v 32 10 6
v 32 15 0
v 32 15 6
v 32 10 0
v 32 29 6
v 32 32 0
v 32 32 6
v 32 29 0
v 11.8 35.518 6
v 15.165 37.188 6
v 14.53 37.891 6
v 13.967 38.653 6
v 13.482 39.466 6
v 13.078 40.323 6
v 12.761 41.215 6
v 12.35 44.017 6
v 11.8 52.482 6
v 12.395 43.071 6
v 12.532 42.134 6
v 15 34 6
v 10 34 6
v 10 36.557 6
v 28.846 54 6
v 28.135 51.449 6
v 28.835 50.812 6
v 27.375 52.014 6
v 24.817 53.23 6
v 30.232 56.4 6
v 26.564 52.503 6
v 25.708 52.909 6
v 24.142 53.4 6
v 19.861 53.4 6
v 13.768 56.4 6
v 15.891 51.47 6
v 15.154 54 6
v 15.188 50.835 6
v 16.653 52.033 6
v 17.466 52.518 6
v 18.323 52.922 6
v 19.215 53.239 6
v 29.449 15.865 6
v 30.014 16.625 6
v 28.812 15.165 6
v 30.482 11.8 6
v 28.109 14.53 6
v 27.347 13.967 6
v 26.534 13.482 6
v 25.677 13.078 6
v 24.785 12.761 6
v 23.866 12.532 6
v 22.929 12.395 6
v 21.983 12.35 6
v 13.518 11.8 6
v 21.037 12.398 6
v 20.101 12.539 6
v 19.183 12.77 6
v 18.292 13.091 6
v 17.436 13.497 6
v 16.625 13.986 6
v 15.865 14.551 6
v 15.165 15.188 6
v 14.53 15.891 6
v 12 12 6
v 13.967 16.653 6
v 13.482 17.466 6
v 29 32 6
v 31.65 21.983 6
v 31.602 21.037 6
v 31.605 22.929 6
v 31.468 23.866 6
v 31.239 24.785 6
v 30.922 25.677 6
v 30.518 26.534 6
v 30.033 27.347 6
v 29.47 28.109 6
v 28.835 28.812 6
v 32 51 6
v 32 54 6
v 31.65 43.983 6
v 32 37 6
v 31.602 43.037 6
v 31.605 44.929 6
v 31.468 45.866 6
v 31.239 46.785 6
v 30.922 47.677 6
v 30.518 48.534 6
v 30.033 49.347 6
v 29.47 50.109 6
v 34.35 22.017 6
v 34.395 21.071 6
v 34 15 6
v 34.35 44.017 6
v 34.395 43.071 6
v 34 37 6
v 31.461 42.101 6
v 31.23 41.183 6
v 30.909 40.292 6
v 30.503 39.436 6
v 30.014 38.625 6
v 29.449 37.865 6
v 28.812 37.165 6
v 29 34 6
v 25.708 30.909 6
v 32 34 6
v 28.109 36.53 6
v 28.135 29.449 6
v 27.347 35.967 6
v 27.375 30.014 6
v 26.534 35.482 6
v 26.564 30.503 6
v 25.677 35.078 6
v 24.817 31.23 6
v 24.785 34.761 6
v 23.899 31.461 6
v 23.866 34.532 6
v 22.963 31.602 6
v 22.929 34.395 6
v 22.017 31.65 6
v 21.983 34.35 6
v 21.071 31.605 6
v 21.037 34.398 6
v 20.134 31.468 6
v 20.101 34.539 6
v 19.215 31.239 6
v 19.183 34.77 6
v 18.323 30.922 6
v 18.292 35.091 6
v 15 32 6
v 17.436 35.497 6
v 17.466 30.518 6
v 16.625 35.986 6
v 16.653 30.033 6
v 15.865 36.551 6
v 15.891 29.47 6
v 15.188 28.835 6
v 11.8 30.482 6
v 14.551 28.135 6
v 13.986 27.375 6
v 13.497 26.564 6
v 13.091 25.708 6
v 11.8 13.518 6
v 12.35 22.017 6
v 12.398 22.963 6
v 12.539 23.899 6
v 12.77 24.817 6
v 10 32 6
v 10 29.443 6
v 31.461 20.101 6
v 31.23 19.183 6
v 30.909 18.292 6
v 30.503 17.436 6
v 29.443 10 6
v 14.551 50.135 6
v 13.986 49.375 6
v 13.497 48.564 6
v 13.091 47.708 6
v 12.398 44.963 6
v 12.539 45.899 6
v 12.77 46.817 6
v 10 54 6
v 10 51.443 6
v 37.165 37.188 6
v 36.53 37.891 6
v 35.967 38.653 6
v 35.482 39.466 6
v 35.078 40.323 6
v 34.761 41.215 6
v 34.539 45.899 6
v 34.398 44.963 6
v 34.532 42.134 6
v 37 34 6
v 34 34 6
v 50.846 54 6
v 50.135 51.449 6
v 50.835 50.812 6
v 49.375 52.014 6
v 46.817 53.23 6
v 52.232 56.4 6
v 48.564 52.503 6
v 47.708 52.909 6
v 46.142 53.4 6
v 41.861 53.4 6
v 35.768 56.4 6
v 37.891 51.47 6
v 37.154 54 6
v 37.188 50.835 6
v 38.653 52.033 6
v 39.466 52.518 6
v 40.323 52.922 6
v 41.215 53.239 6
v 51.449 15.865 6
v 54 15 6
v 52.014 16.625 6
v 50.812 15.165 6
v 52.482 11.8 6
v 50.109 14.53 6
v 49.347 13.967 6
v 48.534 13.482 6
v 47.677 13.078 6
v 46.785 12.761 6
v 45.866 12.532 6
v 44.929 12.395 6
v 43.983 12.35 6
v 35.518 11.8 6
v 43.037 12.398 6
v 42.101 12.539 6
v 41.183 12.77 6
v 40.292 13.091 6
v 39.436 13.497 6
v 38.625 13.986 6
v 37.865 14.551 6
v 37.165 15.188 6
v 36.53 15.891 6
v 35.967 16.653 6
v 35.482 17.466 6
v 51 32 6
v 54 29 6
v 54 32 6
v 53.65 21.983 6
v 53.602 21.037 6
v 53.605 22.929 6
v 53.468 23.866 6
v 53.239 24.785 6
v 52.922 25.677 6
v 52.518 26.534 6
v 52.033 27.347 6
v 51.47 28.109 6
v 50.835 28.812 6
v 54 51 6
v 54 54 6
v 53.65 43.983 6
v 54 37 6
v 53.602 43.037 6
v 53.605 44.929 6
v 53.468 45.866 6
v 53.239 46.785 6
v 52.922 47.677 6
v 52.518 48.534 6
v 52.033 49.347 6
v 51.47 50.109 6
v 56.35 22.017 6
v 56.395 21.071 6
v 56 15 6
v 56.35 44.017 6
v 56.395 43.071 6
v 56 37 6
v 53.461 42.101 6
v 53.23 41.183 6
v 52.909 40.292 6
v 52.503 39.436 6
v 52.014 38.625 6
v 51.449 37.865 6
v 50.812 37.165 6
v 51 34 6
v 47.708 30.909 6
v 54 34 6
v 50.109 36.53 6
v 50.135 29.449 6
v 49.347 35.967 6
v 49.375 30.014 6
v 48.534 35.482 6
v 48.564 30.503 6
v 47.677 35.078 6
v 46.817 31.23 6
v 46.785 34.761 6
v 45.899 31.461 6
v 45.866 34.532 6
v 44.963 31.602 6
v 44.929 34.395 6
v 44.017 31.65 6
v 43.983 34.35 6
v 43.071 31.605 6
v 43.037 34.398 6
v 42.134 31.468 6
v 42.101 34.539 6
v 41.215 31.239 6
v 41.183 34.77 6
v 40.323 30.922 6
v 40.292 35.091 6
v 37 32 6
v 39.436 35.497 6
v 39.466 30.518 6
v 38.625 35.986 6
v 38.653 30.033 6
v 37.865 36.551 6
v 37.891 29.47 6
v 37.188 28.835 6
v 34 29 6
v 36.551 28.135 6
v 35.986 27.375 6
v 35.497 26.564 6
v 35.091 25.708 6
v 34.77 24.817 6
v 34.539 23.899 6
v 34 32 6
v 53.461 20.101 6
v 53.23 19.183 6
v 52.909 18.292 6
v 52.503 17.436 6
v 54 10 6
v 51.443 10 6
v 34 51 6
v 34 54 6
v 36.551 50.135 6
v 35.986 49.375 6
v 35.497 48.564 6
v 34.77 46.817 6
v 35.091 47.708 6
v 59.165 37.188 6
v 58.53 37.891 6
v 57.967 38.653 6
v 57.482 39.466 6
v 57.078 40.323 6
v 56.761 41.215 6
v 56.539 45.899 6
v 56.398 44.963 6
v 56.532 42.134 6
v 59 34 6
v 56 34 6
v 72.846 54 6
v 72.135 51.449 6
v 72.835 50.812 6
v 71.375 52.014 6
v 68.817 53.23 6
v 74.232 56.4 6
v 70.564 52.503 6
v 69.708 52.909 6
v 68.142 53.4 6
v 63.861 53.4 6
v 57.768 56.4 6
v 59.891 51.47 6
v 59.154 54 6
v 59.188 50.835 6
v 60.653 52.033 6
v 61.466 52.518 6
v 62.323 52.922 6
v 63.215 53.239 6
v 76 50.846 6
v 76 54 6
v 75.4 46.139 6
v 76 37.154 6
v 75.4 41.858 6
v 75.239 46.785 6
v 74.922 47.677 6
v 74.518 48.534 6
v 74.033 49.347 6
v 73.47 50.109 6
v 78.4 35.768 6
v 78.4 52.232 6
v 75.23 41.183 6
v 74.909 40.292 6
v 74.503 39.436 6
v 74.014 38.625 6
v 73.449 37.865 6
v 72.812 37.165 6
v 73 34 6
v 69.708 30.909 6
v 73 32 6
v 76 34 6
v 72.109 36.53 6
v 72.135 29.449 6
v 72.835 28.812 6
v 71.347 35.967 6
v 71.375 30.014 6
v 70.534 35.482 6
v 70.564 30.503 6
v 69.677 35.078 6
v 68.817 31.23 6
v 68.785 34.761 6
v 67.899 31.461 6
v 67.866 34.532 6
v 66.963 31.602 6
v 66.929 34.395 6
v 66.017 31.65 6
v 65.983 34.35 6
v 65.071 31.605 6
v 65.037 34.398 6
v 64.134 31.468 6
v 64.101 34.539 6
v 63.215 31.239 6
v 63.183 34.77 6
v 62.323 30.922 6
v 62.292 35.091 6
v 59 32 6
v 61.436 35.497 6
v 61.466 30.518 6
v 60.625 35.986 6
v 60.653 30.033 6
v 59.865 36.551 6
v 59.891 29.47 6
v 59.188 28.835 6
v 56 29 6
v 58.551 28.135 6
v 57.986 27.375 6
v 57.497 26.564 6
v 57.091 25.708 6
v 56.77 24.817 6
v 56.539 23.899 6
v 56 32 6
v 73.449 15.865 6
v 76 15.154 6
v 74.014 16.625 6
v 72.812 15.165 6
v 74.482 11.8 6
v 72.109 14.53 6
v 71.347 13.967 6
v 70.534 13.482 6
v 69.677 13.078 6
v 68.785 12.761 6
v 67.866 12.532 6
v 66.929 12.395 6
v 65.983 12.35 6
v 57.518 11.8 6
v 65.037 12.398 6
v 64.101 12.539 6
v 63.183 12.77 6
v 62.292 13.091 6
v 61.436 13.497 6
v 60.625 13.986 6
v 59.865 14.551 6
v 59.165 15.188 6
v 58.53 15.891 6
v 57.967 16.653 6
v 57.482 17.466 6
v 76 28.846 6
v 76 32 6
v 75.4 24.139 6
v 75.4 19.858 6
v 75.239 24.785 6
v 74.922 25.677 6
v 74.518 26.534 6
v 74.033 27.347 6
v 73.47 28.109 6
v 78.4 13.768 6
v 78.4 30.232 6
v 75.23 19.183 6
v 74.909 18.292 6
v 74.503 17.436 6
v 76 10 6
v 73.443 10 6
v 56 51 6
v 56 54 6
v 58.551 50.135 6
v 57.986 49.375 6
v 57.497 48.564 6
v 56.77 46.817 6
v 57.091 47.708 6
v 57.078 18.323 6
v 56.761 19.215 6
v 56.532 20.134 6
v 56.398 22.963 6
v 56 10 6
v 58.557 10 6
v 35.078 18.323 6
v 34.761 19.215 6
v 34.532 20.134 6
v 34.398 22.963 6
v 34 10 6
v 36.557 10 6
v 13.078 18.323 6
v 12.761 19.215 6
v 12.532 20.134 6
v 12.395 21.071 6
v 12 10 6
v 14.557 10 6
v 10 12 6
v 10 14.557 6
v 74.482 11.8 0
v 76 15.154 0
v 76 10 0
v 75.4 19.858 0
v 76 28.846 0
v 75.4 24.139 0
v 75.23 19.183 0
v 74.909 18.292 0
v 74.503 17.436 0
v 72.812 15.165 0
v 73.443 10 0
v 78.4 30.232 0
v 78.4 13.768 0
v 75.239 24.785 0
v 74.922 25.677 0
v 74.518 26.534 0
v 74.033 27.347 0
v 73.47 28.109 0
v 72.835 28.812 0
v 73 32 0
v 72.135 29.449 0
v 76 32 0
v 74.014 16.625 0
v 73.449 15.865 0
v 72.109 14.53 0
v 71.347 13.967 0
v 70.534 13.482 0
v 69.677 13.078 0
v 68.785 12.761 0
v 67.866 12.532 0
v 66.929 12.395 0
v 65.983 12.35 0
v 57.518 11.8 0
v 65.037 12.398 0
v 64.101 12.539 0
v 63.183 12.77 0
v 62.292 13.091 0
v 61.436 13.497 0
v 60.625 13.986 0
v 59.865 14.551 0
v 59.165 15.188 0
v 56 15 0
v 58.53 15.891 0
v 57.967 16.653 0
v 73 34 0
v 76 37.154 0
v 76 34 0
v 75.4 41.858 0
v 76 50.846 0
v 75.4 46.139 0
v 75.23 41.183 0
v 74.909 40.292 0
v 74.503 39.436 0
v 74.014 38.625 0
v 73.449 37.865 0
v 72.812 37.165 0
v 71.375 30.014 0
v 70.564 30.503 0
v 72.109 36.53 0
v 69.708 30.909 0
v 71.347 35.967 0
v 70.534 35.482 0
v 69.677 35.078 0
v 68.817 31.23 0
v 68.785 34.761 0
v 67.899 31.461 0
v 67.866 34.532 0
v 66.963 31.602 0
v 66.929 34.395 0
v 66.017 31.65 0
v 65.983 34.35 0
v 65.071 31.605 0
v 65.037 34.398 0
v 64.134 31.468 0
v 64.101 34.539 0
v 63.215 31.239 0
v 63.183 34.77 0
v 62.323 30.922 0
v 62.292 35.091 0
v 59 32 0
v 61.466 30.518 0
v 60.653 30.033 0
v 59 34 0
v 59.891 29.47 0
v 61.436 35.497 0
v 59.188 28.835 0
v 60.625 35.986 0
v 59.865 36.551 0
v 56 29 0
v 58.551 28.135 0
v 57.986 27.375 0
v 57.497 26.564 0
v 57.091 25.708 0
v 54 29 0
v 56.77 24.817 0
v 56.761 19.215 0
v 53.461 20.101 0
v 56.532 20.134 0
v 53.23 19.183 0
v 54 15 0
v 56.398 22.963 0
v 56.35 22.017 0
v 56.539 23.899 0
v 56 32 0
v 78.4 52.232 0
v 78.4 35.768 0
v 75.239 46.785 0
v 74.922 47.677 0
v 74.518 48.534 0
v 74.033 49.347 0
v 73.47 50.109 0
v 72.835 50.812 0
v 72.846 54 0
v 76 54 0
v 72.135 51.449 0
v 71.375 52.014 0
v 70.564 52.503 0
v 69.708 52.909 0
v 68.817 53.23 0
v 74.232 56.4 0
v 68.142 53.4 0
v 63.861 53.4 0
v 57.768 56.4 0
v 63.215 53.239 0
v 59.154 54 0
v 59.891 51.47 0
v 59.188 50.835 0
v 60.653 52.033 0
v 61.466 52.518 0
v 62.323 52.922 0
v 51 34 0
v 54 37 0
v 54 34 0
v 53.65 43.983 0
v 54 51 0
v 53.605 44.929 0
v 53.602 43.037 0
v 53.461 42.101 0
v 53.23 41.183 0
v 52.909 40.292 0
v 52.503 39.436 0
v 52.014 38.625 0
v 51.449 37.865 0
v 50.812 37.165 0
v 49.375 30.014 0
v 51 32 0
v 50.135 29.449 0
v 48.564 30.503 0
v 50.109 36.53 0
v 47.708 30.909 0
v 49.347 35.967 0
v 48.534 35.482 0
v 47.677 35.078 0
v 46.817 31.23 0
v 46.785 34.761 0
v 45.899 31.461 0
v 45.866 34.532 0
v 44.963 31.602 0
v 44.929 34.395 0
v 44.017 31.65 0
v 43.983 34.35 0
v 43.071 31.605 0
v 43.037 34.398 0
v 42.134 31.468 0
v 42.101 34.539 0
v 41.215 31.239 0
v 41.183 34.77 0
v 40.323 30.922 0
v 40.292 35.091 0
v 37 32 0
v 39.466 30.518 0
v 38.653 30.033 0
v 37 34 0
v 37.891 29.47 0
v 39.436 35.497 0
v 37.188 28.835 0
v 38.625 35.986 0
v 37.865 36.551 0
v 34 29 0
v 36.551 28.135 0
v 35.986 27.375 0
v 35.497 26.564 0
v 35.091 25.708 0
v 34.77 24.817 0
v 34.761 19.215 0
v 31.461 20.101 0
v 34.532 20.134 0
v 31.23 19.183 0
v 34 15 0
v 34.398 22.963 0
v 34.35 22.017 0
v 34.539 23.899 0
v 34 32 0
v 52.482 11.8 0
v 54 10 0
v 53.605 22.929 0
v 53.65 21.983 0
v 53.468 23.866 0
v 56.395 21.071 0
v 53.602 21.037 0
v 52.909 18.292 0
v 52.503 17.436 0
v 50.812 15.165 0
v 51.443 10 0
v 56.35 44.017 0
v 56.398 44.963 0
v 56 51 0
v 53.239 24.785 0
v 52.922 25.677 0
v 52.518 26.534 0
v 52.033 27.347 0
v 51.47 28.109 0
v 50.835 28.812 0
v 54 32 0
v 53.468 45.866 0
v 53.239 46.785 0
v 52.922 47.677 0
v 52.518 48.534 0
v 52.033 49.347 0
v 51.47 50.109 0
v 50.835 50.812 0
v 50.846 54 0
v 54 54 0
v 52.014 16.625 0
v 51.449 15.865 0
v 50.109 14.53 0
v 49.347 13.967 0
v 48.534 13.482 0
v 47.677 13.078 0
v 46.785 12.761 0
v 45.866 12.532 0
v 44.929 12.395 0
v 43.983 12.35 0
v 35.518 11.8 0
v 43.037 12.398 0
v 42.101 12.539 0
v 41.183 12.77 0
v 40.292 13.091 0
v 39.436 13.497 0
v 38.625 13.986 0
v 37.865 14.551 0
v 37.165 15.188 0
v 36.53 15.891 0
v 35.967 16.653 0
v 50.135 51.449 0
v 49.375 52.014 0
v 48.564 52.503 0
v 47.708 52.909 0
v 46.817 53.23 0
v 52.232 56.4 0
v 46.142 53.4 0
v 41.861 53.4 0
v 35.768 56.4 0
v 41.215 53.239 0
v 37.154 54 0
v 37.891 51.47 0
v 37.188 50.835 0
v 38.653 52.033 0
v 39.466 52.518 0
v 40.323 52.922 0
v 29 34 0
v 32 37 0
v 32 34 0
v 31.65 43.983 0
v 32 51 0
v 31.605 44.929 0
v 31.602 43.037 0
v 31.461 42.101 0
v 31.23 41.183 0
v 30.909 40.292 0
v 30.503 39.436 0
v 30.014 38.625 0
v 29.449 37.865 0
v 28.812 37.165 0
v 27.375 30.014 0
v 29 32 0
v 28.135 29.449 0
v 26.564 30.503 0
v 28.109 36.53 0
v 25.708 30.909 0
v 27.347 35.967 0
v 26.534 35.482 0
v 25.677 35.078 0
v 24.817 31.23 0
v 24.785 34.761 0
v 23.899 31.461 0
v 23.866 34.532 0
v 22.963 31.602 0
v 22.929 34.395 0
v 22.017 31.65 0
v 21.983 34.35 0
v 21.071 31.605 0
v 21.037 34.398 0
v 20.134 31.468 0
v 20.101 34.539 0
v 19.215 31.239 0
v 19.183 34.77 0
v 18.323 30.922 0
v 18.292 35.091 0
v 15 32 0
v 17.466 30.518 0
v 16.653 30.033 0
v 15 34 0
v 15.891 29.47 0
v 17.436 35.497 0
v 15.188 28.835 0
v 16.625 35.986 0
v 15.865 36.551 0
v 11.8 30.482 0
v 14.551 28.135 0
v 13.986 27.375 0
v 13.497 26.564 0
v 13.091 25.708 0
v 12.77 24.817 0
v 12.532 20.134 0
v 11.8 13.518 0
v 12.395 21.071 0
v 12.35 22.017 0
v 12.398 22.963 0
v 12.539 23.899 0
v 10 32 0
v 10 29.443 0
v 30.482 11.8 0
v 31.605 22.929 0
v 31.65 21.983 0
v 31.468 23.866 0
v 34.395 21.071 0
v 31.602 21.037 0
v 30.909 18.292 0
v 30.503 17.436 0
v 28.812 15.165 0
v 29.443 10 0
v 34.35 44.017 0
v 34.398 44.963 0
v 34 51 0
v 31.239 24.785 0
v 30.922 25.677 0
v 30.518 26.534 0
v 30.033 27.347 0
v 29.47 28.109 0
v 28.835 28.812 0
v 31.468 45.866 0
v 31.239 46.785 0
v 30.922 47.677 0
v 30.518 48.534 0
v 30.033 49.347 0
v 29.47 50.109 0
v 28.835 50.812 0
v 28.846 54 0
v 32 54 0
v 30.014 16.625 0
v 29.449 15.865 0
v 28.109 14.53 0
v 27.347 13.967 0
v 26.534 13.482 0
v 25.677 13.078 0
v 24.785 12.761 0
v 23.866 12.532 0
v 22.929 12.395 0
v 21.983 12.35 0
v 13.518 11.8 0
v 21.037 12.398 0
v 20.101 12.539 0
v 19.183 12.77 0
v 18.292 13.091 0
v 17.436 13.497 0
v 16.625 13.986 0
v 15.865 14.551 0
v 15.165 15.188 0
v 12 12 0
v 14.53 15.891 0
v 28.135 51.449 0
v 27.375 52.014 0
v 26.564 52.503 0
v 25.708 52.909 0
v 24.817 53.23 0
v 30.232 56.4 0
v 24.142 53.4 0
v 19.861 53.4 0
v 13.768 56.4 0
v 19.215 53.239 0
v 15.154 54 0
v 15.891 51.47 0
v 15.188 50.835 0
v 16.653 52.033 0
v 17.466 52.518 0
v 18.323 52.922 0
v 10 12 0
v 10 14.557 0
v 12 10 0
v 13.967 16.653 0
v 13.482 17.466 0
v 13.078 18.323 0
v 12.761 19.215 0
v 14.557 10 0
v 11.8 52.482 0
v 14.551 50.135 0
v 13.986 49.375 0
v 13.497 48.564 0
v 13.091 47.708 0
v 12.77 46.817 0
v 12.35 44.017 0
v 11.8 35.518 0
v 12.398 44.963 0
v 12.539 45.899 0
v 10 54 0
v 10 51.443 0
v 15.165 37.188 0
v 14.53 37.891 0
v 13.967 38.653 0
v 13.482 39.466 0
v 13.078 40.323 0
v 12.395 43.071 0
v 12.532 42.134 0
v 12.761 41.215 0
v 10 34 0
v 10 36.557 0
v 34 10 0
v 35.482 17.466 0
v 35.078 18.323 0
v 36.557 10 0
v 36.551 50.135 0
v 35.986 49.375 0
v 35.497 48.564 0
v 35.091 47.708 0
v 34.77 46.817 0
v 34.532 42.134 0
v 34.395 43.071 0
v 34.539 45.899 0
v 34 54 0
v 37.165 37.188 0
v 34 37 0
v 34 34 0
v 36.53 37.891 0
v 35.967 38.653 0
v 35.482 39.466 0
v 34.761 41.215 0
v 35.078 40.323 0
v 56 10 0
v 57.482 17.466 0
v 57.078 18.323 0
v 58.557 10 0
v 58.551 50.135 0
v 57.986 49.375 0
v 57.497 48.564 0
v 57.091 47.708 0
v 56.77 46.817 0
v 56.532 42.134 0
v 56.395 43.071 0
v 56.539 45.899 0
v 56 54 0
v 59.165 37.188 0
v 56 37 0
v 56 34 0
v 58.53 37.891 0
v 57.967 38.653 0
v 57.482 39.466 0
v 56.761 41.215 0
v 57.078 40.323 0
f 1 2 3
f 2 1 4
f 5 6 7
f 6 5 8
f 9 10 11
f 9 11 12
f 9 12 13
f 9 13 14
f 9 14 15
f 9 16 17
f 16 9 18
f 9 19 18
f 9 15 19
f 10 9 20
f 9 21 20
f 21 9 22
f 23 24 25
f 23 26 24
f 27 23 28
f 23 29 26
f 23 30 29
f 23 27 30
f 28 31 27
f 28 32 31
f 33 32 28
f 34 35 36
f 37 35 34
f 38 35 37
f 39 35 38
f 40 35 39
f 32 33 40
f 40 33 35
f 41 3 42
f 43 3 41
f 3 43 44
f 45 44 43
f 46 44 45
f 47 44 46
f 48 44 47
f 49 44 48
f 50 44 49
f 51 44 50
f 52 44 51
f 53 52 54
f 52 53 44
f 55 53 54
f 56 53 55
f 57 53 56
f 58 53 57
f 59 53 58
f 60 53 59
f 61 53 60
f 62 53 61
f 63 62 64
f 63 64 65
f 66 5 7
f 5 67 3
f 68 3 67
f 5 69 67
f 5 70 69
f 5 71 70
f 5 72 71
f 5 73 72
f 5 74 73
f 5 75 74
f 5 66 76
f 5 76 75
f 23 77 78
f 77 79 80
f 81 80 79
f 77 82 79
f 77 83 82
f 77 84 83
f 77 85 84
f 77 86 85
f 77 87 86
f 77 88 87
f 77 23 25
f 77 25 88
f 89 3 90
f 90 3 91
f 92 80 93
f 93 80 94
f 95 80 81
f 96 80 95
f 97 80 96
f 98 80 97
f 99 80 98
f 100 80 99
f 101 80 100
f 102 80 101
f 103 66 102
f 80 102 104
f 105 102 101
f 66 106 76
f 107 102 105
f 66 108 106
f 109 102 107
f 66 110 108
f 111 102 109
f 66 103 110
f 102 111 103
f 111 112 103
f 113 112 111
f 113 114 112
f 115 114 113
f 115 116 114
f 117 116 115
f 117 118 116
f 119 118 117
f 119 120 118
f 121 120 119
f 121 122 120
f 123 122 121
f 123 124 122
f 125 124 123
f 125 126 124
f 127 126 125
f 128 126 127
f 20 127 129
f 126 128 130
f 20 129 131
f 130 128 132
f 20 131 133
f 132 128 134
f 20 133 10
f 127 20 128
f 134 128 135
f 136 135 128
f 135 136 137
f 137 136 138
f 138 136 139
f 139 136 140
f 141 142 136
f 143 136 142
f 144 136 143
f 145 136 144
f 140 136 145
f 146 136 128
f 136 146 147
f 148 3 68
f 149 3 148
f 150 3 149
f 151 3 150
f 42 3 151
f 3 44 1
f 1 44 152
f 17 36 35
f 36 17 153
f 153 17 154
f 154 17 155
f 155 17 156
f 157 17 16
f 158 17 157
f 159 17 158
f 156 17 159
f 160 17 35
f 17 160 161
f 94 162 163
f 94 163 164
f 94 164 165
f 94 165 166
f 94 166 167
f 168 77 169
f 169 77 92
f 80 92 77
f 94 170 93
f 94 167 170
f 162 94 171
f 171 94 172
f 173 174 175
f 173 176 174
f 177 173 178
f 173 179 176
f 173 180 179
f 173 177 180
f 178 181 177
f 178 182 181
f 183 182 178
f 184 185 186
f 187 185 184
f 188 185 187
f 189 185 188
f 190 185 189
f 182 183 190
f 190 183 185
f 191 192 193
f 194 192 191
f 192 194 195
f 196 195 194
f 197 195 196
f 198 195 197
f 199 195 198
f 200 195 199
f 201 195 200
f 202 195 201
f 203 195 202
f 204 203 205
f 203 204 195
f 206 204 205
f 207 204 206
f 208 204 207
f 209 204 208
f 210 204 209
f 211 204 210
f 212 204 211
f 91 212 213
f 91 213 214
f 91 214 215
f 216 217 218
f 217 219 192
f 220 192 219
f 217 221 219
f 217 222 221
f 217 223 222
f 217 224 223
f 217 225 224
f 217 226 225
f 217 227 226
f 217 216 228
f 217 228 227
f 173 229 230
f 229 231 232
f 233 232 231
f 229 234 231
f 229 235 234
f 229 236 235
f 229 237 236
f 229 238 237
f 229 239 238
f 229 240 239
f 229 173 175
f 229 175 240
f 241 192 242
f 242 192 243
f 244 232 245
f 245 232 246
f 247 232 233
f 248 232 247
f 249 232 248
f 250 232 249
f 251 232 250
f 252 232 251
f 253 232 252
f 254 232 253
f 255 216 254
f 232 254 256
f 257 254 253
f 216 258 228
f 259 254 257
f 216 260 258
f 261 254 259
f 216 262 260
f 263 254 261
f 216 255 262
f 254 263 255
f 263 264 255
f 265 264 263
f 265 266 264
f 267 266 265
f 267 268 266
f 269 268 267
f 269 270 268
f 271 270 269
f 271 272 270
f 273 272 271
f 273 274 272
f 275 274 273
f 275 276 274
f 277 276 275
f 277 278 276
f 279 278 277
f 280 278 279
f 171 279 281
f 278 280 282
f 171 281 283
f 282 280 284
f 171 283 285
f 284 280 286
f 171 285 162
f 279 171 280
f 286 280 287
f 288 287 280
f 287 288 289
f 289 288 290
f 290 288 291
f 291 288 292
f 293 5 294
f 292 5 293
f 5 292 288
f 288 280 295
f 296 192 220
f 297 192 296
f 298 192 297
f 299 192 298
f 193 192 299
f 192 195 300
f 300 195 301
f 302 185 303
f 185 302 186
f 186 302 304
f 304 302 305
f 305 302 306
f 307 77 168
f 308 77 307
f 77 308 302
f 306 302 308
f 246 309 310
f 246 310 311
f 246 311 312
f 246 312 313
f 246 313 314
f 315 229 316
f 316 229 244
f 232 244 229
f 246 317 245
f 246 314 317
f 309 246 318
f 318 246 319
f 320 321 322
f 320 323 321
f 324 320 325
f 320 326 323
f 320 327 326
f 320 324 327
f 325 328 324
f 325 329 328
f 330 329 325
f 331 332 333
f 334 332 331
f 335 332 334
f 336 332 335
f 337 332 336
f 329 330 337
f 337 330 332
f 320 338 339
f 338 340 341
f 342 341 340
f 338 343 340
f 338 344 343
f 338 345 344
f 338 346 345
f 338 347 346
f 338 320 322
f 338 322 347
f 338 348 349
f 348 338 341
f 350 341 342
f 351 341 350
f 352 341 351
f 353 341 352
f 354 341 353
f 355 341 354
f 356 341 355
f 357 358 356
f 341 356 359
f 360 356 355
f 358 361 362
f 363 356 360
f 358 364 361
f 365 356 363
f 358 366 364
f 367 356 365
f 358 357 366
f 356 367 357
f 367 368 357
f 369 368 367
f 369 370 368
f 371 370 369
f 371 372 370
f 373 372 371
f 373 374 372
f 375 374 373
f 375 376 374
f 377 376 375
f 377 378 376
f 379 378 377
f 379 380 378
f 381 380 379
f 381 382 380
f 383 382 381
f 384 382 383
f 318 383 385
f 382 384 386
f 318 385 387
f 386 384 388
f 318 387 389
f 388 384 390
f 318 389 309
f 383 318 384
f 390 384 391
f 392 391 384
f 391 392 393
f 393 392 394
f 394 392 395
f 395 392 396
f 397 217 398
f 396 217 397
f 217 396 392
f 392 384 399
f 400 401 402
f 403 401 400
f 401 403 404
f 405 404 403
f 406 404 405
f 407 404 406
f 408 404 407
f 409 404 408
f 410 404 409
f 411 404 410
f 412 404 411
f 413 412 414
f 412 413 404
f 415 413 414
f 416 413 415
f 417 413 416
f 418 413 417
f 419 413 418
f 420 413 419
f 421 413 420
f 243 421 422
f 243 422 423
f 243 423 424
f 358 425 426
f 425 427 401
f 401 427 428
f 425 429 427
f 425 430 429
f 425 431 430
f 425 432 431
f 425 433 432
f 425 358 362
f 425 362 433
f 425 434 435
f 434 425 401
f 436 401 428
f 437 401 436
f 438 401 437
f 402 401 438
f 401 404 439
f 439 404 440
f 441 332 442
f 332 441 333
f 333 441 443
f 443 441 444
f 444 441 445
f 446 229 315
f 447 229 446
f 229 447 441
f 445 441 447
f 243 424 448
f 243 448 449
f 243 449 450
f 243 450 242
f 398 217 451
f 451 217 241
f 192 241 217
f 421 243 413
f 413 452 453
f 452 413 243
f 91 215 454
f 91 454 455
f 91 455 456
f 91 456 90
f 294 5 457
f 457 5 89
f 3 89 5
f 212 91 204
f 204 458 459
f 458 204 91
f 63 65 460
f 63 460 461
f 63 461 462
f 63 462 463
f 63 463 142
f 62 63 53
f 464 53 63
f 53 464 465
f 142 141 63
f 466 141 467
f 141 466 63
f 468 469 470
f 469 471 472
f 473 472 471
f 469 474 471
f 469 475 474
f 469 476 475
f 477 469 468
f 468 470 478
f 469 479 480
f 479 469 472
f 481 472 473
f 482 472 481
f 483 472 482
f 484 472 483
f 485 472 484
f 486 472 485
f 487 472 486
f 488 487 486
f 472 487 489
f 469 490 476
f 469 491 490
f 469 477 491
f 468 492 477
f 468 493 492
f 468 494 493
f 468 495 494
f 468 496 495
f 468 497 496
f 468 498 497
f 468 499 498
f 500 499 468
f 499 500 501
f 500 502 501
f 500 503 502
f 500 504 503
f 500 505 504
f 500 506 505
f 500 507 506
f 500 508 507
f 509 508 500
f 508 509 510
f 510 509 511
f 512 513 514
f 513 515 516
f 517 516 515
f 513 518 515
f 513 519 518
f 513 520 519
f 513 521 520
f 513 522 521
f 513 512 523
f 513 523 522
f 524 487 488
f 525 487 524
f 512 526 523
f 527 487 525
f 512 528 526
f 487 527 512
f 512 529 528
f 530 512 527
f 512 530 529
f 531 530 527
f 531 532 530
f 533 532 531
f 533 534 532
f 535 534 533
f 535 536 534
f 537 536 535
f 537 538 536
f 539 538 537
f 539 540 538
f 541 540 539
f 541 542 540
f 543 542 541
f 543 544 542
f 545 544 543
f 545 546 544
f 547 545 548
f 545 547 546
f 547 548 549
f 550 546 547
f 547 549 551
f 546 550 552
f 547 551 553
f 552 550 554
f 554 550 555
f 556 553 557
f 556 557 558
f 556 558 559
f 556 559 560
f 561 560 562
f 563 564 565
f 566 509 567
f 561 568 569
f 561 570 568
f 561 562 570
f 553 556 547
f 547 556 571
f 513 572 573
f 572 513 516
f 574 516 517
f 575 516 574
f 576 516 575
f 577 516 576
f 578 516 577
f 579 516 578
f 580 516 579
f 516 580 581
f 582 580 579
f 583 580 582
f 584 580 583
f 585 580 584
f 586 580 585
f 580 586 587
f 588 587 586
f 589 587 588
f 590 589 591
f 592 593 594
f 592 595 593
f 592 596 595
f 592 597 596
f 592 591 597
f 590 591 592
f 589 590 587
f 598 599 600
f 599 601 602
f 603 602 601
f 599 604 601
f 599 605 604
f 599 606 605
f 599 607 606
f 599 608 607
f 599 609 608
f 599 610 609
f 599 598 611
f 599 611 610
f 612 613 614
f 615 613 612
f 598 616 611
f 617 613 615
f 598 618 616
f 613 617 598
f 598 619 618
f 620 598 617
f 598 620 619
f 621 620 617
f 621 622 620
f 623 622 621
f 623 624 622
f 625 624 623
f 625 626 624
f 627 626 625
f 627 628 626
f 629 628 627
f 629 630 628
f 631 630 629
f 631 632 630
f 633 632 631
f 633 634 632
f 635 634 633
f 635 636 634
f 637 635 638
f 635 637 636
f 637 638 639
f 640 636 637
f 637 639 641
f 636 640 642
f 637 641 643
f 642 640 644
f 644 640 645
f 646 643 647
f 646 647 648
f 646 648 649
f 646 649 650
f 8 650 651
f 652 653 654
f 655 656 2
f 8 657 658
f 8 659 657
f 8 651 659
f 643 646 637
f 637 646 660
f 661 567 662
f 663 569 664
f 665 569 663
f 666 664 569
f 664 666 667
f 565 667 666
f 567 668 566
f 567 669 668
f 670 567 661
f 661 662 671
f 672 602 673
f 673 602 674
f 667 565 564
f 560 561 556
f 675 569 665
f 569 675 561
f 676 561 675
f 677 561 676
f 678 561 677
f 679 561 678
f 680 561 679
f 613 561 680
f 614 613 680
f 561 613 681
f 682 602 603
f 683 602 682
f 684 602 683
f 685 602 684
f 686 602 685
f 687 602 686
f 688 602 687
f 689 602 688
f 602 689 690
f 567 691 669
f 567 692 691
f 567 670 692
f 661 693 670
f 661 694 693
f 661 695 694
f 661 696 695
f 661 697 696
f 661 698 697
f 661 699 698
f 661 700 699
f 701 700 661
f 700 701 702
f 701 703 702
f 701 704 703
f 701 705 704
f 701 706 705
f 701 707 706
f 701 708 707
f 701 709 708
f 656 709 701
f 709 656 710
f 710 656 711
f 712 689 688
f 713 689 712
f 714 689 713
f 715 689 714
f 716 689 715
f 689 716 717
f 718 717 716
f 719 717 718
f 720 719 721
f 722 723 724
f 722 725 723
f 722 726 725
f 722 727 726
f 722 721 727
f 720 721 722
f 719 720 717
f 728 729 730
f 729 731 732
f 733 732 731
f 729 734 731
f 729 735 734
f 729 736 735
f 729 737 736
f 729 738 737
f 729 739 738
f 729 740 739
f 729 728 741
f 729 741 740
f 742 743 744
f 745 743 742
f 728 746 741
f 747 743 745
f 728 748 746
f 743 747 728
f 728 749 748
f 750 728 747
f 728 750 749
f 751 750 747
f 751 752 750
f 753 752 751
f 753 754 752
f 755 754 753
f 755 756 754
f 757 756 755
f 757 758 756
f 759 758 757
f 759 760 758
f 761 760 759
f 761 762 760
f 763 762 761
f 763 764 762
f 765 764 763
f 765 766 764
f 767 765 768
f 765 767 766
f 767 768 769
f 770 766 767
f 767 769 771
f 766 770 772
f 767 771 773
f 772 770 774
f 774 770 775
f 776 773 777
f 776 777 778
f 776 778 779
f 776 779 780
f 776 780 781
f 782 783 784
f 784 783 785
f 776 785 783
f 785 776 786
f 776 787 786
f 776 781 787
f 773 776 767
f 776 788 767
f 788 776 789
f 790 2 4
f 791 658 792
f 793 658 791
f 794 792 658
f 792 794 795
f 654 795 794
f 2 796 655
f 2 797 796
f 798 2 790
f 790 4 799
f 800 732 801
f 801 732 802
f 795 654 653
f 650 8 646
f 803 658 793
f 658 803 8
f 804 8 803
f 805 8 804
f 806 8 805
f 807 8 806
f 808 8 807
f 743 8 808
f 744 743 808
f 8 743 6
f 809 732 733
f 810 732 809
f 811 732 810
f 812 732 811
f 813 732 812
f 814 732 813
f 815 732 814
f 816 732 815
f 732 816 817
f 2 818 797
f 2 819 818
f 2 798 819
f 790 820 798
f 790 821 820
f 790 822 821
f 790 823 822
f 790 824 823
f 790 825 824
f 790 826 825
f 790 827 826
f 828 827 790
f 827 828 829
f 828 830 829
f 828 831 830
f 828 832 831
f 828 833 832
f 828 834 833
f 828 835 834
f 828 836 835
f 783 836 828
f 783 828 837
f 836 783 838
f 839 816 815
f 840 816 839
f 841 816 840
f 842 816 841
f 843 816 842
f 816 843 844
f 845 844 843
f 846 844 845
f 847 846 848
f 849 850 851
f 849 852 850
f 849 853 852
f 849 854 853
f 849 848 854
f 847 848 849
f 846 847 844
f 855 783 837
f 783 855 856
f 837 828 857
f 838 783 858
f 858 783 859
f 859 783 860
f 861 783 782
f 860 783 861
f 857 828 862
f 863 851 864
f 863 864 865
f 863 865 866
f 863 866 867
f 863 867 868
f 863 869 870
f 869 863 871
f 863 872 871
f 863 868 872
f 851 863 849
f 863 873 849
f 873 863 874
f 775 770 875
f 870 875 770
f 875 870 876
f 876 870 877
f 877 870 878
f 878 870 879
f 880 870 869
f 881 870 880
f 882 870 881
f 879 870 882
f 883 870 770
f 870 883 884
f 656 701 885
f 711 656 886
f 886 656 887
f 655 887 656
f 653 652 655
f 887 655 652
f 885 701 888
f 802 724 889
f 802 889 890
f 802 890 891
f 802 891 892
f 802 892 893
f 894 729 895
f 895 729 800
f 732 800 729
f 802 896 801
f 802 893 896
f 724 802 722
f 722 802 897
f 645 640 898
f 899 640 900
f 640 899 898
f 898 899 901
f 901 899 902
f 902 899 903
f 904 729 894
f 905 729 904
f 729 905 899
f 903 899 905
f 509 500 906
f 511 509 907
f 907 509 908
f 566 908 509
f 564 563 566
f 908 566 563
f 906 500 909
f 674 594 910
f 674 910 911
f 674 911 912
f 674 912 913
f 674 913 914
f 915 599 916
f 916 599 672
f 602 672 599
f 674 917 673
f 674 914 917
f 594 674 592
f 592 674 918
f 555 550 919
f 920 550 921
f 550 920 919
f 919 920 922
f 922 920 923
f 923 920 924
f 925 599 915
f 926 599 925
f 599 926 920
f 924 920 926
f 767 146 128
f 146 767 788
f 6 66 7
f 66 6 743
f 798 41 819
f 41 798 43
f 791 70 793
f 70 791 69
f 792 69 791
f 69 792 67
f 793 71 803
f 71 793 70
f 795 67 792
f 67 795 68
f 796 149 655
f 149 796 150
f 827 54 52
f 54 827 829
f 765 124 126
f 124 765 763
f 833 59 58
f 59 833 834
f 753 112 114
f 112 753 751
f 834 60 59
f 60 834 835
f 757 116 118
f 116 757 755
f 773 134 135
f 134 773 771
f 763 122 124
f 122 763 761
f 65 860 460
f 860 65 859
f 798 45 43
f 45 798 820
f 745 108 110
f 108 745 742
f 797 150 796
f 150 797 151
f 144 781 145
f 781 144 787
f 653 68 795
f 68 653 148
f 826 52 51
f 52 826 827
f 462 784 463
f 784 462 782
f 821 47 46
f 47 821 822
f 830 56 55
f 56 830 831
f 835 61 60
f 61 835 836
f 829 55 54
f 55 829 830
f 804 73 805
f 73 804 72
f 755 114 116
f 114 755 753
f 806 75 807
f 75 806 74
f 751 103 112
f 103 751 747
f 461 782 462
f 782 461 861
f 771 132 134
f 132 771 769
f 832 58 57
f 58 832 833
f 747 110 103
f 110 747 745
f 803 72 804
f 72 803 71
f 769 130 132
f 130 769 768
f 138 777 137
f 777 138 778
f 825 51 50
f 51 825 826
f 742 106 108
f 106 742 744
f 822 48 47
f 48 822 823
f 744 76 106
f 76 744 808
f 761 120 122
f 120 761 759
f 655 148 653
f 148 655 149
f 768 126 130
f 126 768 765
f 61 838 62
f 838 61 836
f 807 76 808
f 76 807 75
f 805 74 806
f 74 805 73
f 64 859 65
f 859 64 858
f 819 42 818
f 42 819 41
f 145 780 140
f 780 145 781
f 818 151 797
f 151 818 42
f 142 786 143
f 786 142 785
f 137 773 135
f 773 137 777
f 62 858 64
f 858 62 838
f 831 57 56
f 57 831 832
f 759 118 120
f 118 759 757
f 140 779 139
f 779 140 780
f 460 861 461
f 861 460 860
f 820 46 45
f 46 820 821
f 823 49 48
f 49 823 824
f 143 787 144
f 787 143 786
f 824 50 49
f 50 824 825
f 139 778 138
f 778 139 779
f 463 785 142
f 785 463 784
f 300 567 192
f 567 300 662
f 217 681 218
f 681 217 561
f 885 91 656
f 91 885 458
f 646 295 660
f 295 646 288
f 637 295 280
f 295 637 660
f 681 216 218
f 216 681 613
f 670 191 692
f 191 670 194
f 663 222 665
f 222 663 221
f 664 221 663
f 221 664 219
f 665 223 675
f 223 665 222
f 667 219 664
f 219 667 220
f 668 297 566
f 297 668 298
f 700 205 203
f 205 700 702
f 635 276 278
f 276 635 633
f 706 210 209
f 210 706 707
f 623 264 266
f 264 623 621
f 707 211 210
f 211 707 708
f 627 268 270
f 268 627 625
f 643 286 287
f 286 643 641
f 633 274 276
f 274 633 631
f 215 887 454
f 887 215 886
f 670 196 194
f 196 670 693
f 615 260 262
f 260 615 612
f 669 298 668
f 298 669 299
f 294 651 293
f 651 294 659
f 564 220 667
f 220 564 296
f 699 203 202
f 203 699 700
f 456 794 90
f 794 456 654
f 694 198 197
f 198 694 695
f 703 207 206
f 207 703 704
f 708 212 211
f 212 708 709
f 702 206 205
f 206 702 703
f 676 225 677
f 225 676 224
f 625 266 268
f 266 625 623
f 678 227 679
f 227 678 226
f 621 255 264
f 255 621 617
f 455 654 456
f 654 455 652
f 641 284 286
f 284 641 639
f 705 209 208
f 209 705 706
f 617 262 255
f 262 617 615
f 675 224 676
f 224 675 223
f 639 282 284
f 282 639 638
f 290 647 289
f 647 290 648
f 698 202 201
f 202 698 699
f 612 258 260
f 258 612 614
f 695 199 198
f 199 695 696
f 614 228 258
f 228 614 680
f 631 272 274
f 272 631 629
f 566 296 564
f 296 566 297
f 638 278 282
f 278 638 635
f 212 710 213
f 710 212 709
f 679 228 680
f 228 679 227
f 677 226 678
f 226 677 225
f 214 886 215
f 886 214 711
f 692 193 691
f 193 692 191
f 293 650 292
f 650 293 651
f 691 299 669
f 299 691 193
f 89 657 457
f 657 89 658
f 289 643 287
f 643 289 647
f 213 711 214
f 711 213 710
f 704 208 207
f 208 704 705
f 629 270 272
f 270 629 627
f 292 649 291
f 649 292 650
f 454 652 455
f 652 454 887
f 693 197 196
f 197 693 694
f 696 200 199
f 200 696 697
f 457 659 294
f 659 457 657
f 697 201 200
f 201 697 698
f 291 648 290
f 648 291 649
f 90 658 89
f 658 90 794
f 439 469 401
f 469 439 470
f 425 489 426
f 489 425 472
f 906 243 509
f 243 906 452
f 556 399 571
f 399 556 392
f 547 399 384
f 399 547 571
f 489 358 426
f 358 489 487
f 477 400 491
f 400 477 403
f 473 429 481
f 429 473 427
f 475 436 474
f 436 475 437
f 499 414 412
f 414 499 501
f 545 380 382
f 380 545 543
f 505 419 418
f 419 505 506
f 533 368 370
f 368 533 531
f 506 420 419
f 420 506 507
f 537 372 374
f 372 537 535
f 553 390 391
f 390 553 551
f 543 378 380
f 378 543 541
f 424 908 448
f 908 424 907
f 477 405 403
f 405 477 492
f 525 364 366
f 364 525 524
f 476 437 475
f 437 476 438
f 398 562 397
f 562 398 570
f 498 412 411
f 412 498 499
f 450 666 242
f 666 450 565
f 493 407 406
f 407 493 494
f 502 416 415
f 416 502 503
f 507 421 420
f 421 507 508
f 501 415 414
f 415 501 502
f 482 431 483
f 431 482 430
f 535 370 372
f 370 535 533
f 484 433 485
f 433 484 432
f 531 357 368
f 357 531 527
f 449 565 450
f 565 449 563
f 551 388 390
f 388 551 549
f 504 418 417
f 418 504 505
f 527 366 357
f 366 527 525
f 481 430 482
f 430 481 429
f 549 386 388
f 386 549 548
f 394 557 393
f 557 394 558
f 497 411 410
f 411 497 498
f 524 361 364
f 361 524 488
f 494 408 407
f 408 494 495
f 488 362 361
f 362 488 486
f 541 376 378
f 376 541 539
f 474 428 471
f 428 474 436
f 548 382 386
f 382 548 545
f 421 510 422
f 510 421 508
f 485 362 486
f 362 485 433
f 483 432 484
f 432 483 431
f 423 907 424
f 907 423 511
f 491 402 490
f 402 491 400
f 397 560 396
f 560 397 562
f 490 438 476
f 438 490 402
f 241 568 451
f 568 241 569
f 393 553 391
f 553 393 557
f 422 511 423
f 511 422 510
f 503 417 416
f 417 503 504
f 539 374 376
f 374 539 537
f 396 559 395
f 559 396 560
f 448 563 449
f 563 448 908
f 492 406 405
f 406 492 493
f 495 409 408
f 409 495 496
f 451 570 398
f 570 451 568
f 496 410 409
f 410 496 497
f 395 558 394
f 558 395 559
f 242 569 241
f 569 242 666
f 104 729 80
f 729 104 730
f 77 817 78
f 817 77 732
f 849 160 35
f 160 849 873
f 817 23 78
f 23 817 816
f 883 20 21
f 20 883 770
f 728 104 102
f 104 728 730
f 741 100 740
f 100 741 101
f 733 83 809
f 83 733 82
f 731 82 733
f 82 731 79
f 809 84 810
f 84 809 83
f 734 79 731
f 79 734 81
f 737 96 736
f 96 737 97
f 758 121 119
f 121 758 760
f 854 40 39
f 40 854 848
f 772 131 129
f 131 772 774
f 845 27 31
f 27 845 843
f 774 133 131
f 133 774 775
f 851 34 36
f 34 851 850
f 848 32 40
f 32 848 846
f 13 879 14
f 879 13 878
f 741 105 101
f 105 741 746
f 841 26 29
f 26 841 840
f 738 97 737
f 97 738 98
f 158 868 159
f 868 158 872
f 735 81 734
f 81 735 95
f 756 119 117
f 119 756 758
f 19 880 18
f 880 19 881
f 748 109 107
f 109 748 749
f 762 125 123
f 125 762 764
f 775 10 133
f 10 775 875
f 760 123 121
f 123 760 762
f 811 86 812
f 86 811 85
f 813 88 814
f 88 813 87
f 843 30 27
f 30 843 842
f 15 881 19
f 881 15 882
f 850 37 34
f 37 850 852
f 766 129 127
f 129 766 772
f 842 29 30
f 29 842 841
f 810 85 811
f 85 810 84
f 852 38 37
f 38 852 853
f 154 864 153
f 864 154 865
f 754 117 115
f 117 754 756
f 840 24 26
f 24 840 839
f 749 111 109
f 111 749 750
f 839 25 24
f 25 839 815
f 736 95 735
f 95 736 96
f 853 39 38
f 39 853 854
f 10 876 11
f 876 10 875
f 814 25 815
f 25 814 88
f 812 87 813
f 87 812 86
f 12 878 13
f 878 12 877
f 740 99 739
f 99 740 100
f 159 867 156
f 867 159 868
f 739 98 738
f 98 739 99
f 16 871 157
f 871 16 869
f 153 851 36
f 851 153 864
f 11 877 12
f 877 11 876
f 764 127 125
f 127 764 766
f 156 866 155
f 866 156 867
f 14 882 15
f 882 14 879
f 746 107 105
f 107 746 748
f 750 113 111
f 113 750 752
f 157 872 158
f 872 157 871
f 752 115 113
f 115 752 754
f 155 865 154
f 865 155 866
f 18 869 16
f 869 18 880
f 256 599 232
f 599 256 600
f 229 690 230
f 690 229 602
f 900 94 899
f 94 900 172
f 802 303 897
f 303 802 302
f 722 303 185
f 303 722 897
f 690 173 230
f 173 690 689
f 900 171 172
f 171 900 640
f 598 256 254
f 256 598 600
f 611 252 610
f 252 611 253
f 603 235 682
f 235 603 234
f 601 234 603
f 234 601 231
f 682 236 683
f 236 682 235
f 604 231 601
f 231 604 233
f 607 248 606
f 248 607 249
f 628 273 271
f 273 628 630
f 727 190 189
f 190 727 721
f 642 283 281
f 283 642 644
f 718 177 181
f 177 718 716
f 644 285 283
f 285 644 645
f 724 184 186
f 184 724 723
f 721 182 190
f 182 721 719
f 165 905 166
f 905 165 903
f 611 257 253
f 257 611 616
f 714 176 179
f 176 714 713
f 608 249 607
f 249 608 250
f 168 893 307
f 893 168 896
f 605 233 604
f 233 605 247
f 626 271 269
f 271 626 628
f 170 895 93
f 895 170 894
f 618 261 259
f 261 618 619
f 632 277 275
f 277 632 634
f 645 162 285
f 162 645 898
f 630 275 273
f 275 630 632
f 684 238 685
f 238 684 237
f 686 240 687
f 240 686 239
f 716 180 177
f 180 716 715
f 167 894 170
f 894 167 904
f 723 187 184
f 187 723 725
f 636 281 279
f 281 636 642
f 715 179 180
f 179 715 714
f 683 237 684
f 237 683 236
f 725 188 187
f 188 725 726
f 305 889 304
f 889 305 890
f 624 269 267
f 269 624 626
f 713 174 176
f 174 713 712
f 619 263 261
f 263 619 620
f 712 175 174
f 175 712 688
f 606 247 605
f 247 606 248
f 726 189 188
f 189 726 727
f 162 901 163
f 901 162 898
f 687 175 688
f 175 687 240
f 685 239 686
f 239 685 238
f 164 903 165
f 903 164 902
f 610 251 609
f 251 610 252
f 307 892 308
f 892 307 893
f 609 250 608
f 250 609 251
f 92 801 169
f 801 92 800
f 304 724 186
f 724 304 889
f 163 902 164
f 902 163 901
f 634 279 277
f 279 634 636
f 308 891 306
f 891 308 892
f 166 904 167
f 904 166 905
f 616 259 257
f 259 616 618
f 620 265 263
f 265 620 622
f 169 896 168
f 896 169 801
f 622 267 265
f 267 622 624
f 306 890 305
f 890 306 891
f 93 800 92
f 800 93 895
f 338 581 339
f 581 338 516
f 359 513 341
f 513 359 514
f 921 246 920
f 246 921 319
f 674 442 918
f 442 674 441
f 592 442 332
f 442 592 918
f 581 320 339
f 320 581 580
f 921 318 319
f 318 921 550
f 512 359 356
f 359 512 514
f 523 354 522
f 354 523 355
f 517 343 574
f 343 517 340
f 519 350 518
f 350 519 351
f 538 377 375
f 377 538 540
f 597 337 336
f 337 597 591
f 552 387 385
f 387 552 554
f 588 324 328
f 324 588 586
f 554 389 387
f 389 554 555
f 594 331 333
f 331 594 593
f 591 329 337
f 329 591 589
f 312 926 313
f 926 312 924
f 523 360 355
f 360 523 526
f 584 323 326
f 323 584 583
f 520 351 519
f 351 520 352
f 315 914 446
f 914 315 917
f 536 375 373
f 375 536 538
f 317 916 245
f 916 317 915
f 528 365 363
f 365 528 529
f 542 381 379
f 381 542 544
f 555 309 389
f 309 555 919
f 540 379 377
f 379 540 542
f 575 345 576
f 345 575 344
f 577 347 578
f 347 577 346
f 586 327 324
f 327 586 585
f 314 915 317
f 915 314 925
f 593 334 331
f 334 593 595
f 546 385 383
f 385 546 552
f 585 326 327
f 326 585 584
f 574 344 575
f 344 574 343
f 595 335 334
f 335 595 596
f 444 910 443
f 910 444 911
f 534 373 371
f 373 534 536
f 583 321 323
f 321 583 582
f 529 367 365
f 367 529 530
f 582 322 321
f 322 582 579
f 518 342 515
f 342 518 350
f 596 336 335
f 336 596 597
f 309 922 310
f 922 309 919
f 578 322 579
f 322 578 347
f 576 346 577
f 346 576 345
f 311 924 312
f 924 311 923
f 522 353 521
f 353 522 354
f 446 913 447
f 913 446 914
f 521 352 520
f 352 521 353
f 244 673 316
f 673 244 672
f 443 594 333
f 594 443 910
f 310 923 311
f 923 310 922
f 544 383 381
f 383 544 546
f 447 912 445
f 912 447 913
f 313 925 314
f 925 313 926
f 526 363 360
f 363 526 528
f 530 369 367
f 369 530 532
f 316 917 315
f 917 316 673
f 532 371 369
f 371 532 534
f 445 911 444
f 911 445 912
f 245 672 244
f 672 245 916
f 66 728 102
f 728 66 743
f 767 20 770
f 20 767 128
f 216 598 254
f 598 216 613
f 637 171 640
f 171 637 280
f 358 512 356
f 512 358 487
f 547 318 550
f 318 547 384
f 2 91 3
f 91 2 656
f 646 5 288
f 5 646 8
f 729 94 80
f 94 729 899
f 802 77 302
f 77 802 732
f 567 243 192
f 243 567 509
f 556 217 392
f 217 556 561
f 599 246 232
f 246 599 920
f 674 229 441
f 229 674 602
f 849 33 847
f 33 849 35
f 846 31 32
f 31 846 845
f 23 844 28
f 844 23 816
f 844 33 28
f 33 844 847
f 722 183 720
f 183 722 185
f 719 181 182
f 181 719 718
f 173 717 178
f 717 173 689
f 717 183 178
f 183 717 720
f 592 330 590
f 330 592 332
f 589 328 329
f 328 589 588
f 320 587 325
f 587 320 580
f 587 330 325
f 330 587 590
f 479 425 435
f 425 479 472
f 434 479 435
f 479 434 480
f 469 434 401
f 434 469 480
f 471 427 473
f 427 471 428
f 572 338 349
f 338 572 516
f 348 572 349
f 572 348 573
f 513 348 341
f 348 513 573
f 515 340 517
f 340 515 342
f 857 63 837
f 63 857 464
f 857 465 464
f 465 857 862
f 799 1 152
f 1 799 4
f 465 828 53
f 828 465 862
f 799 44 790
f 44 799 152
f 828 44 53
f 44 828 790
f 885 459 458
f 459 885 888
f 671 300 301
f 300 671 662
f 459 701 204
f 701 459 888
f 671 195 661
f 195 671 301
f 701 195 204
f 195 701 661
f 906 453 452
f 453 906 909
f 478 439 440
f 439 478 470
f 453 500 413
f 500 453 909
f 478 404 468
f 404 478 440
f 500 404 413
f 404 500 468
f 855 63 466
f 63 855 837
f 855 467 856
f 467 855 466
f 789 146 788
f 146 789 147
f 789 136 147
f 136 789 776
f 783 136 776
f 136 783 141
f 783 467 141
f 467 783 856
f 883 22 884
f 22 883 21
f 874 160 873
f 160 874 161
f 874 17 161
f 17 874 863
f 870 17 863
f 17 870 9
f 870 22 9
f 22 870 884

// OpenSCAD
// Improved, modular version of the 18650 battery holder script
// Based on https://www.thingiverse.com/thing:3026658

// Constants
diameter = 18.8; // Diameter of 18650 cell
height = 6;      // Height of holder
tab = 1.4;       // Tab height
tolerance = 0.5; // Tolerance to help fit

// Main configuration module
module batteryHolderConfig(cells_x = 2, cells_y = 2, negative = 0, cable_tie = 1) {
    // Generate the grid of cells and connectors
    generateCells(cells_x, cells_y, negative, cable_tie, diameter, height, tab);
    generateGaps(cells_x, cells_y, cable_tie, height);
    generateConnectors(cells_x, cells_y, height, tolerance, cable_tie);
}

// Generates the grid of cells
module generateCells(cells_x, cells_y, negative, cable_tie, diameter, height, tab) {
    for ( y= [1:1:cells_y]) for ( x= [ 1:1:cells_x]) 
        translate ([x*22,y*22,0]) cell(diameter, height, tab, negative);
}

// Fills gaps between cells
module generateGaps(cells_x, cells_y, cable_tie, height) {
    for ( x= [1:1:cells_x]) for ( y= [1:1:cells_y-1])    
        translate([22*x- (cable_tie ==1 ? 7: 12),22*y+10,0]) cube([cable_tie ==1 ? 14 : 22,2,height]);

    for ( x= [1:1:cells_x-1]) for ( y= [1:1:cells_y])    
        translate([22*x+12,22*y-(cable_tie ==1 ? 7: 10),0]) rotate([0,0,90]) cube([cable_tie ==1 ? 14: 22,2,height]);
}

// Adds male and female connectors
module generateConnectors(cells_x, cells_y, height, tolerance, cable_tie) {
    for ( x= [1:1:cells_x]) translate([22*x,22*cells_y+11.4,0]) trapezoid(13, height);
    for ( y= [1:1:cells_y]) translate([22*cells_x+11.4,22*y,0]) rotate([0,0,-90]) trapezoid(13, height);
    
    for ( x= [1:1:cells_x]) difference() {
        translate([22*x,11,height/2])cube([20,2,height],center=true);
        translate([22*x,10.8,0]) trapezoid(13+tolerance, height);
    }
    for ( y= [1:1:cells_y]) difference() {
        rotate([0,0,90]) translate([22*y,-11,height/2])cube([20,2,height],center=true);
        rotate([0,0,90]) translate([22*y,-10.8,0]) rotate([0,0,180]) trapezoid(13+tolerance, height);
    }
}

// Module for trapezoid (connectors)
module trapezoid(length, height) {
    hull() { 
        translate([-length/2, 0, 0]) rotate([0,0,30]) cylinder (r = 2, h=height,  $fn=3); 
        translate([length/2, 0, 0]) rotate([0,0,30]) cylinder (r = 2, h=height,  $fn=3);
    }
}

// Module to create a single cell
module cell(diameter, height, tab, negative) {
    difference() {
        union() {
            translate([0,0,height/2]) cube([20,20,height],center = true);
            if (!negative) for (rotation =[45:90:325]) rotate([0,0,rotation])  
                translate([0,9,0]) hull(){     
                    translate([1,0,height]) cylinder(r=2, h=tab, $fn=16);
                    translate([1,1,height]) cylinder(r=2, h=tab, $fn=16);
                    translate([0,1,height]) cylinder(r=2, h=tab, $fn=16);
                    translate([0,0,height]) cylinder(r=2, h=tab, $fn=16);
                } 
        }
        rotate([0,0,-0.1]) cylinder(r=diameter/2 + tolerance/2, h= height+ 0.2, $fn=64); // Hole for cell
    }
}

// Example usage:
batteryHolderConfig(cells_x = 3, cells_y = 2, negative = 1, cable_tie = 1);
